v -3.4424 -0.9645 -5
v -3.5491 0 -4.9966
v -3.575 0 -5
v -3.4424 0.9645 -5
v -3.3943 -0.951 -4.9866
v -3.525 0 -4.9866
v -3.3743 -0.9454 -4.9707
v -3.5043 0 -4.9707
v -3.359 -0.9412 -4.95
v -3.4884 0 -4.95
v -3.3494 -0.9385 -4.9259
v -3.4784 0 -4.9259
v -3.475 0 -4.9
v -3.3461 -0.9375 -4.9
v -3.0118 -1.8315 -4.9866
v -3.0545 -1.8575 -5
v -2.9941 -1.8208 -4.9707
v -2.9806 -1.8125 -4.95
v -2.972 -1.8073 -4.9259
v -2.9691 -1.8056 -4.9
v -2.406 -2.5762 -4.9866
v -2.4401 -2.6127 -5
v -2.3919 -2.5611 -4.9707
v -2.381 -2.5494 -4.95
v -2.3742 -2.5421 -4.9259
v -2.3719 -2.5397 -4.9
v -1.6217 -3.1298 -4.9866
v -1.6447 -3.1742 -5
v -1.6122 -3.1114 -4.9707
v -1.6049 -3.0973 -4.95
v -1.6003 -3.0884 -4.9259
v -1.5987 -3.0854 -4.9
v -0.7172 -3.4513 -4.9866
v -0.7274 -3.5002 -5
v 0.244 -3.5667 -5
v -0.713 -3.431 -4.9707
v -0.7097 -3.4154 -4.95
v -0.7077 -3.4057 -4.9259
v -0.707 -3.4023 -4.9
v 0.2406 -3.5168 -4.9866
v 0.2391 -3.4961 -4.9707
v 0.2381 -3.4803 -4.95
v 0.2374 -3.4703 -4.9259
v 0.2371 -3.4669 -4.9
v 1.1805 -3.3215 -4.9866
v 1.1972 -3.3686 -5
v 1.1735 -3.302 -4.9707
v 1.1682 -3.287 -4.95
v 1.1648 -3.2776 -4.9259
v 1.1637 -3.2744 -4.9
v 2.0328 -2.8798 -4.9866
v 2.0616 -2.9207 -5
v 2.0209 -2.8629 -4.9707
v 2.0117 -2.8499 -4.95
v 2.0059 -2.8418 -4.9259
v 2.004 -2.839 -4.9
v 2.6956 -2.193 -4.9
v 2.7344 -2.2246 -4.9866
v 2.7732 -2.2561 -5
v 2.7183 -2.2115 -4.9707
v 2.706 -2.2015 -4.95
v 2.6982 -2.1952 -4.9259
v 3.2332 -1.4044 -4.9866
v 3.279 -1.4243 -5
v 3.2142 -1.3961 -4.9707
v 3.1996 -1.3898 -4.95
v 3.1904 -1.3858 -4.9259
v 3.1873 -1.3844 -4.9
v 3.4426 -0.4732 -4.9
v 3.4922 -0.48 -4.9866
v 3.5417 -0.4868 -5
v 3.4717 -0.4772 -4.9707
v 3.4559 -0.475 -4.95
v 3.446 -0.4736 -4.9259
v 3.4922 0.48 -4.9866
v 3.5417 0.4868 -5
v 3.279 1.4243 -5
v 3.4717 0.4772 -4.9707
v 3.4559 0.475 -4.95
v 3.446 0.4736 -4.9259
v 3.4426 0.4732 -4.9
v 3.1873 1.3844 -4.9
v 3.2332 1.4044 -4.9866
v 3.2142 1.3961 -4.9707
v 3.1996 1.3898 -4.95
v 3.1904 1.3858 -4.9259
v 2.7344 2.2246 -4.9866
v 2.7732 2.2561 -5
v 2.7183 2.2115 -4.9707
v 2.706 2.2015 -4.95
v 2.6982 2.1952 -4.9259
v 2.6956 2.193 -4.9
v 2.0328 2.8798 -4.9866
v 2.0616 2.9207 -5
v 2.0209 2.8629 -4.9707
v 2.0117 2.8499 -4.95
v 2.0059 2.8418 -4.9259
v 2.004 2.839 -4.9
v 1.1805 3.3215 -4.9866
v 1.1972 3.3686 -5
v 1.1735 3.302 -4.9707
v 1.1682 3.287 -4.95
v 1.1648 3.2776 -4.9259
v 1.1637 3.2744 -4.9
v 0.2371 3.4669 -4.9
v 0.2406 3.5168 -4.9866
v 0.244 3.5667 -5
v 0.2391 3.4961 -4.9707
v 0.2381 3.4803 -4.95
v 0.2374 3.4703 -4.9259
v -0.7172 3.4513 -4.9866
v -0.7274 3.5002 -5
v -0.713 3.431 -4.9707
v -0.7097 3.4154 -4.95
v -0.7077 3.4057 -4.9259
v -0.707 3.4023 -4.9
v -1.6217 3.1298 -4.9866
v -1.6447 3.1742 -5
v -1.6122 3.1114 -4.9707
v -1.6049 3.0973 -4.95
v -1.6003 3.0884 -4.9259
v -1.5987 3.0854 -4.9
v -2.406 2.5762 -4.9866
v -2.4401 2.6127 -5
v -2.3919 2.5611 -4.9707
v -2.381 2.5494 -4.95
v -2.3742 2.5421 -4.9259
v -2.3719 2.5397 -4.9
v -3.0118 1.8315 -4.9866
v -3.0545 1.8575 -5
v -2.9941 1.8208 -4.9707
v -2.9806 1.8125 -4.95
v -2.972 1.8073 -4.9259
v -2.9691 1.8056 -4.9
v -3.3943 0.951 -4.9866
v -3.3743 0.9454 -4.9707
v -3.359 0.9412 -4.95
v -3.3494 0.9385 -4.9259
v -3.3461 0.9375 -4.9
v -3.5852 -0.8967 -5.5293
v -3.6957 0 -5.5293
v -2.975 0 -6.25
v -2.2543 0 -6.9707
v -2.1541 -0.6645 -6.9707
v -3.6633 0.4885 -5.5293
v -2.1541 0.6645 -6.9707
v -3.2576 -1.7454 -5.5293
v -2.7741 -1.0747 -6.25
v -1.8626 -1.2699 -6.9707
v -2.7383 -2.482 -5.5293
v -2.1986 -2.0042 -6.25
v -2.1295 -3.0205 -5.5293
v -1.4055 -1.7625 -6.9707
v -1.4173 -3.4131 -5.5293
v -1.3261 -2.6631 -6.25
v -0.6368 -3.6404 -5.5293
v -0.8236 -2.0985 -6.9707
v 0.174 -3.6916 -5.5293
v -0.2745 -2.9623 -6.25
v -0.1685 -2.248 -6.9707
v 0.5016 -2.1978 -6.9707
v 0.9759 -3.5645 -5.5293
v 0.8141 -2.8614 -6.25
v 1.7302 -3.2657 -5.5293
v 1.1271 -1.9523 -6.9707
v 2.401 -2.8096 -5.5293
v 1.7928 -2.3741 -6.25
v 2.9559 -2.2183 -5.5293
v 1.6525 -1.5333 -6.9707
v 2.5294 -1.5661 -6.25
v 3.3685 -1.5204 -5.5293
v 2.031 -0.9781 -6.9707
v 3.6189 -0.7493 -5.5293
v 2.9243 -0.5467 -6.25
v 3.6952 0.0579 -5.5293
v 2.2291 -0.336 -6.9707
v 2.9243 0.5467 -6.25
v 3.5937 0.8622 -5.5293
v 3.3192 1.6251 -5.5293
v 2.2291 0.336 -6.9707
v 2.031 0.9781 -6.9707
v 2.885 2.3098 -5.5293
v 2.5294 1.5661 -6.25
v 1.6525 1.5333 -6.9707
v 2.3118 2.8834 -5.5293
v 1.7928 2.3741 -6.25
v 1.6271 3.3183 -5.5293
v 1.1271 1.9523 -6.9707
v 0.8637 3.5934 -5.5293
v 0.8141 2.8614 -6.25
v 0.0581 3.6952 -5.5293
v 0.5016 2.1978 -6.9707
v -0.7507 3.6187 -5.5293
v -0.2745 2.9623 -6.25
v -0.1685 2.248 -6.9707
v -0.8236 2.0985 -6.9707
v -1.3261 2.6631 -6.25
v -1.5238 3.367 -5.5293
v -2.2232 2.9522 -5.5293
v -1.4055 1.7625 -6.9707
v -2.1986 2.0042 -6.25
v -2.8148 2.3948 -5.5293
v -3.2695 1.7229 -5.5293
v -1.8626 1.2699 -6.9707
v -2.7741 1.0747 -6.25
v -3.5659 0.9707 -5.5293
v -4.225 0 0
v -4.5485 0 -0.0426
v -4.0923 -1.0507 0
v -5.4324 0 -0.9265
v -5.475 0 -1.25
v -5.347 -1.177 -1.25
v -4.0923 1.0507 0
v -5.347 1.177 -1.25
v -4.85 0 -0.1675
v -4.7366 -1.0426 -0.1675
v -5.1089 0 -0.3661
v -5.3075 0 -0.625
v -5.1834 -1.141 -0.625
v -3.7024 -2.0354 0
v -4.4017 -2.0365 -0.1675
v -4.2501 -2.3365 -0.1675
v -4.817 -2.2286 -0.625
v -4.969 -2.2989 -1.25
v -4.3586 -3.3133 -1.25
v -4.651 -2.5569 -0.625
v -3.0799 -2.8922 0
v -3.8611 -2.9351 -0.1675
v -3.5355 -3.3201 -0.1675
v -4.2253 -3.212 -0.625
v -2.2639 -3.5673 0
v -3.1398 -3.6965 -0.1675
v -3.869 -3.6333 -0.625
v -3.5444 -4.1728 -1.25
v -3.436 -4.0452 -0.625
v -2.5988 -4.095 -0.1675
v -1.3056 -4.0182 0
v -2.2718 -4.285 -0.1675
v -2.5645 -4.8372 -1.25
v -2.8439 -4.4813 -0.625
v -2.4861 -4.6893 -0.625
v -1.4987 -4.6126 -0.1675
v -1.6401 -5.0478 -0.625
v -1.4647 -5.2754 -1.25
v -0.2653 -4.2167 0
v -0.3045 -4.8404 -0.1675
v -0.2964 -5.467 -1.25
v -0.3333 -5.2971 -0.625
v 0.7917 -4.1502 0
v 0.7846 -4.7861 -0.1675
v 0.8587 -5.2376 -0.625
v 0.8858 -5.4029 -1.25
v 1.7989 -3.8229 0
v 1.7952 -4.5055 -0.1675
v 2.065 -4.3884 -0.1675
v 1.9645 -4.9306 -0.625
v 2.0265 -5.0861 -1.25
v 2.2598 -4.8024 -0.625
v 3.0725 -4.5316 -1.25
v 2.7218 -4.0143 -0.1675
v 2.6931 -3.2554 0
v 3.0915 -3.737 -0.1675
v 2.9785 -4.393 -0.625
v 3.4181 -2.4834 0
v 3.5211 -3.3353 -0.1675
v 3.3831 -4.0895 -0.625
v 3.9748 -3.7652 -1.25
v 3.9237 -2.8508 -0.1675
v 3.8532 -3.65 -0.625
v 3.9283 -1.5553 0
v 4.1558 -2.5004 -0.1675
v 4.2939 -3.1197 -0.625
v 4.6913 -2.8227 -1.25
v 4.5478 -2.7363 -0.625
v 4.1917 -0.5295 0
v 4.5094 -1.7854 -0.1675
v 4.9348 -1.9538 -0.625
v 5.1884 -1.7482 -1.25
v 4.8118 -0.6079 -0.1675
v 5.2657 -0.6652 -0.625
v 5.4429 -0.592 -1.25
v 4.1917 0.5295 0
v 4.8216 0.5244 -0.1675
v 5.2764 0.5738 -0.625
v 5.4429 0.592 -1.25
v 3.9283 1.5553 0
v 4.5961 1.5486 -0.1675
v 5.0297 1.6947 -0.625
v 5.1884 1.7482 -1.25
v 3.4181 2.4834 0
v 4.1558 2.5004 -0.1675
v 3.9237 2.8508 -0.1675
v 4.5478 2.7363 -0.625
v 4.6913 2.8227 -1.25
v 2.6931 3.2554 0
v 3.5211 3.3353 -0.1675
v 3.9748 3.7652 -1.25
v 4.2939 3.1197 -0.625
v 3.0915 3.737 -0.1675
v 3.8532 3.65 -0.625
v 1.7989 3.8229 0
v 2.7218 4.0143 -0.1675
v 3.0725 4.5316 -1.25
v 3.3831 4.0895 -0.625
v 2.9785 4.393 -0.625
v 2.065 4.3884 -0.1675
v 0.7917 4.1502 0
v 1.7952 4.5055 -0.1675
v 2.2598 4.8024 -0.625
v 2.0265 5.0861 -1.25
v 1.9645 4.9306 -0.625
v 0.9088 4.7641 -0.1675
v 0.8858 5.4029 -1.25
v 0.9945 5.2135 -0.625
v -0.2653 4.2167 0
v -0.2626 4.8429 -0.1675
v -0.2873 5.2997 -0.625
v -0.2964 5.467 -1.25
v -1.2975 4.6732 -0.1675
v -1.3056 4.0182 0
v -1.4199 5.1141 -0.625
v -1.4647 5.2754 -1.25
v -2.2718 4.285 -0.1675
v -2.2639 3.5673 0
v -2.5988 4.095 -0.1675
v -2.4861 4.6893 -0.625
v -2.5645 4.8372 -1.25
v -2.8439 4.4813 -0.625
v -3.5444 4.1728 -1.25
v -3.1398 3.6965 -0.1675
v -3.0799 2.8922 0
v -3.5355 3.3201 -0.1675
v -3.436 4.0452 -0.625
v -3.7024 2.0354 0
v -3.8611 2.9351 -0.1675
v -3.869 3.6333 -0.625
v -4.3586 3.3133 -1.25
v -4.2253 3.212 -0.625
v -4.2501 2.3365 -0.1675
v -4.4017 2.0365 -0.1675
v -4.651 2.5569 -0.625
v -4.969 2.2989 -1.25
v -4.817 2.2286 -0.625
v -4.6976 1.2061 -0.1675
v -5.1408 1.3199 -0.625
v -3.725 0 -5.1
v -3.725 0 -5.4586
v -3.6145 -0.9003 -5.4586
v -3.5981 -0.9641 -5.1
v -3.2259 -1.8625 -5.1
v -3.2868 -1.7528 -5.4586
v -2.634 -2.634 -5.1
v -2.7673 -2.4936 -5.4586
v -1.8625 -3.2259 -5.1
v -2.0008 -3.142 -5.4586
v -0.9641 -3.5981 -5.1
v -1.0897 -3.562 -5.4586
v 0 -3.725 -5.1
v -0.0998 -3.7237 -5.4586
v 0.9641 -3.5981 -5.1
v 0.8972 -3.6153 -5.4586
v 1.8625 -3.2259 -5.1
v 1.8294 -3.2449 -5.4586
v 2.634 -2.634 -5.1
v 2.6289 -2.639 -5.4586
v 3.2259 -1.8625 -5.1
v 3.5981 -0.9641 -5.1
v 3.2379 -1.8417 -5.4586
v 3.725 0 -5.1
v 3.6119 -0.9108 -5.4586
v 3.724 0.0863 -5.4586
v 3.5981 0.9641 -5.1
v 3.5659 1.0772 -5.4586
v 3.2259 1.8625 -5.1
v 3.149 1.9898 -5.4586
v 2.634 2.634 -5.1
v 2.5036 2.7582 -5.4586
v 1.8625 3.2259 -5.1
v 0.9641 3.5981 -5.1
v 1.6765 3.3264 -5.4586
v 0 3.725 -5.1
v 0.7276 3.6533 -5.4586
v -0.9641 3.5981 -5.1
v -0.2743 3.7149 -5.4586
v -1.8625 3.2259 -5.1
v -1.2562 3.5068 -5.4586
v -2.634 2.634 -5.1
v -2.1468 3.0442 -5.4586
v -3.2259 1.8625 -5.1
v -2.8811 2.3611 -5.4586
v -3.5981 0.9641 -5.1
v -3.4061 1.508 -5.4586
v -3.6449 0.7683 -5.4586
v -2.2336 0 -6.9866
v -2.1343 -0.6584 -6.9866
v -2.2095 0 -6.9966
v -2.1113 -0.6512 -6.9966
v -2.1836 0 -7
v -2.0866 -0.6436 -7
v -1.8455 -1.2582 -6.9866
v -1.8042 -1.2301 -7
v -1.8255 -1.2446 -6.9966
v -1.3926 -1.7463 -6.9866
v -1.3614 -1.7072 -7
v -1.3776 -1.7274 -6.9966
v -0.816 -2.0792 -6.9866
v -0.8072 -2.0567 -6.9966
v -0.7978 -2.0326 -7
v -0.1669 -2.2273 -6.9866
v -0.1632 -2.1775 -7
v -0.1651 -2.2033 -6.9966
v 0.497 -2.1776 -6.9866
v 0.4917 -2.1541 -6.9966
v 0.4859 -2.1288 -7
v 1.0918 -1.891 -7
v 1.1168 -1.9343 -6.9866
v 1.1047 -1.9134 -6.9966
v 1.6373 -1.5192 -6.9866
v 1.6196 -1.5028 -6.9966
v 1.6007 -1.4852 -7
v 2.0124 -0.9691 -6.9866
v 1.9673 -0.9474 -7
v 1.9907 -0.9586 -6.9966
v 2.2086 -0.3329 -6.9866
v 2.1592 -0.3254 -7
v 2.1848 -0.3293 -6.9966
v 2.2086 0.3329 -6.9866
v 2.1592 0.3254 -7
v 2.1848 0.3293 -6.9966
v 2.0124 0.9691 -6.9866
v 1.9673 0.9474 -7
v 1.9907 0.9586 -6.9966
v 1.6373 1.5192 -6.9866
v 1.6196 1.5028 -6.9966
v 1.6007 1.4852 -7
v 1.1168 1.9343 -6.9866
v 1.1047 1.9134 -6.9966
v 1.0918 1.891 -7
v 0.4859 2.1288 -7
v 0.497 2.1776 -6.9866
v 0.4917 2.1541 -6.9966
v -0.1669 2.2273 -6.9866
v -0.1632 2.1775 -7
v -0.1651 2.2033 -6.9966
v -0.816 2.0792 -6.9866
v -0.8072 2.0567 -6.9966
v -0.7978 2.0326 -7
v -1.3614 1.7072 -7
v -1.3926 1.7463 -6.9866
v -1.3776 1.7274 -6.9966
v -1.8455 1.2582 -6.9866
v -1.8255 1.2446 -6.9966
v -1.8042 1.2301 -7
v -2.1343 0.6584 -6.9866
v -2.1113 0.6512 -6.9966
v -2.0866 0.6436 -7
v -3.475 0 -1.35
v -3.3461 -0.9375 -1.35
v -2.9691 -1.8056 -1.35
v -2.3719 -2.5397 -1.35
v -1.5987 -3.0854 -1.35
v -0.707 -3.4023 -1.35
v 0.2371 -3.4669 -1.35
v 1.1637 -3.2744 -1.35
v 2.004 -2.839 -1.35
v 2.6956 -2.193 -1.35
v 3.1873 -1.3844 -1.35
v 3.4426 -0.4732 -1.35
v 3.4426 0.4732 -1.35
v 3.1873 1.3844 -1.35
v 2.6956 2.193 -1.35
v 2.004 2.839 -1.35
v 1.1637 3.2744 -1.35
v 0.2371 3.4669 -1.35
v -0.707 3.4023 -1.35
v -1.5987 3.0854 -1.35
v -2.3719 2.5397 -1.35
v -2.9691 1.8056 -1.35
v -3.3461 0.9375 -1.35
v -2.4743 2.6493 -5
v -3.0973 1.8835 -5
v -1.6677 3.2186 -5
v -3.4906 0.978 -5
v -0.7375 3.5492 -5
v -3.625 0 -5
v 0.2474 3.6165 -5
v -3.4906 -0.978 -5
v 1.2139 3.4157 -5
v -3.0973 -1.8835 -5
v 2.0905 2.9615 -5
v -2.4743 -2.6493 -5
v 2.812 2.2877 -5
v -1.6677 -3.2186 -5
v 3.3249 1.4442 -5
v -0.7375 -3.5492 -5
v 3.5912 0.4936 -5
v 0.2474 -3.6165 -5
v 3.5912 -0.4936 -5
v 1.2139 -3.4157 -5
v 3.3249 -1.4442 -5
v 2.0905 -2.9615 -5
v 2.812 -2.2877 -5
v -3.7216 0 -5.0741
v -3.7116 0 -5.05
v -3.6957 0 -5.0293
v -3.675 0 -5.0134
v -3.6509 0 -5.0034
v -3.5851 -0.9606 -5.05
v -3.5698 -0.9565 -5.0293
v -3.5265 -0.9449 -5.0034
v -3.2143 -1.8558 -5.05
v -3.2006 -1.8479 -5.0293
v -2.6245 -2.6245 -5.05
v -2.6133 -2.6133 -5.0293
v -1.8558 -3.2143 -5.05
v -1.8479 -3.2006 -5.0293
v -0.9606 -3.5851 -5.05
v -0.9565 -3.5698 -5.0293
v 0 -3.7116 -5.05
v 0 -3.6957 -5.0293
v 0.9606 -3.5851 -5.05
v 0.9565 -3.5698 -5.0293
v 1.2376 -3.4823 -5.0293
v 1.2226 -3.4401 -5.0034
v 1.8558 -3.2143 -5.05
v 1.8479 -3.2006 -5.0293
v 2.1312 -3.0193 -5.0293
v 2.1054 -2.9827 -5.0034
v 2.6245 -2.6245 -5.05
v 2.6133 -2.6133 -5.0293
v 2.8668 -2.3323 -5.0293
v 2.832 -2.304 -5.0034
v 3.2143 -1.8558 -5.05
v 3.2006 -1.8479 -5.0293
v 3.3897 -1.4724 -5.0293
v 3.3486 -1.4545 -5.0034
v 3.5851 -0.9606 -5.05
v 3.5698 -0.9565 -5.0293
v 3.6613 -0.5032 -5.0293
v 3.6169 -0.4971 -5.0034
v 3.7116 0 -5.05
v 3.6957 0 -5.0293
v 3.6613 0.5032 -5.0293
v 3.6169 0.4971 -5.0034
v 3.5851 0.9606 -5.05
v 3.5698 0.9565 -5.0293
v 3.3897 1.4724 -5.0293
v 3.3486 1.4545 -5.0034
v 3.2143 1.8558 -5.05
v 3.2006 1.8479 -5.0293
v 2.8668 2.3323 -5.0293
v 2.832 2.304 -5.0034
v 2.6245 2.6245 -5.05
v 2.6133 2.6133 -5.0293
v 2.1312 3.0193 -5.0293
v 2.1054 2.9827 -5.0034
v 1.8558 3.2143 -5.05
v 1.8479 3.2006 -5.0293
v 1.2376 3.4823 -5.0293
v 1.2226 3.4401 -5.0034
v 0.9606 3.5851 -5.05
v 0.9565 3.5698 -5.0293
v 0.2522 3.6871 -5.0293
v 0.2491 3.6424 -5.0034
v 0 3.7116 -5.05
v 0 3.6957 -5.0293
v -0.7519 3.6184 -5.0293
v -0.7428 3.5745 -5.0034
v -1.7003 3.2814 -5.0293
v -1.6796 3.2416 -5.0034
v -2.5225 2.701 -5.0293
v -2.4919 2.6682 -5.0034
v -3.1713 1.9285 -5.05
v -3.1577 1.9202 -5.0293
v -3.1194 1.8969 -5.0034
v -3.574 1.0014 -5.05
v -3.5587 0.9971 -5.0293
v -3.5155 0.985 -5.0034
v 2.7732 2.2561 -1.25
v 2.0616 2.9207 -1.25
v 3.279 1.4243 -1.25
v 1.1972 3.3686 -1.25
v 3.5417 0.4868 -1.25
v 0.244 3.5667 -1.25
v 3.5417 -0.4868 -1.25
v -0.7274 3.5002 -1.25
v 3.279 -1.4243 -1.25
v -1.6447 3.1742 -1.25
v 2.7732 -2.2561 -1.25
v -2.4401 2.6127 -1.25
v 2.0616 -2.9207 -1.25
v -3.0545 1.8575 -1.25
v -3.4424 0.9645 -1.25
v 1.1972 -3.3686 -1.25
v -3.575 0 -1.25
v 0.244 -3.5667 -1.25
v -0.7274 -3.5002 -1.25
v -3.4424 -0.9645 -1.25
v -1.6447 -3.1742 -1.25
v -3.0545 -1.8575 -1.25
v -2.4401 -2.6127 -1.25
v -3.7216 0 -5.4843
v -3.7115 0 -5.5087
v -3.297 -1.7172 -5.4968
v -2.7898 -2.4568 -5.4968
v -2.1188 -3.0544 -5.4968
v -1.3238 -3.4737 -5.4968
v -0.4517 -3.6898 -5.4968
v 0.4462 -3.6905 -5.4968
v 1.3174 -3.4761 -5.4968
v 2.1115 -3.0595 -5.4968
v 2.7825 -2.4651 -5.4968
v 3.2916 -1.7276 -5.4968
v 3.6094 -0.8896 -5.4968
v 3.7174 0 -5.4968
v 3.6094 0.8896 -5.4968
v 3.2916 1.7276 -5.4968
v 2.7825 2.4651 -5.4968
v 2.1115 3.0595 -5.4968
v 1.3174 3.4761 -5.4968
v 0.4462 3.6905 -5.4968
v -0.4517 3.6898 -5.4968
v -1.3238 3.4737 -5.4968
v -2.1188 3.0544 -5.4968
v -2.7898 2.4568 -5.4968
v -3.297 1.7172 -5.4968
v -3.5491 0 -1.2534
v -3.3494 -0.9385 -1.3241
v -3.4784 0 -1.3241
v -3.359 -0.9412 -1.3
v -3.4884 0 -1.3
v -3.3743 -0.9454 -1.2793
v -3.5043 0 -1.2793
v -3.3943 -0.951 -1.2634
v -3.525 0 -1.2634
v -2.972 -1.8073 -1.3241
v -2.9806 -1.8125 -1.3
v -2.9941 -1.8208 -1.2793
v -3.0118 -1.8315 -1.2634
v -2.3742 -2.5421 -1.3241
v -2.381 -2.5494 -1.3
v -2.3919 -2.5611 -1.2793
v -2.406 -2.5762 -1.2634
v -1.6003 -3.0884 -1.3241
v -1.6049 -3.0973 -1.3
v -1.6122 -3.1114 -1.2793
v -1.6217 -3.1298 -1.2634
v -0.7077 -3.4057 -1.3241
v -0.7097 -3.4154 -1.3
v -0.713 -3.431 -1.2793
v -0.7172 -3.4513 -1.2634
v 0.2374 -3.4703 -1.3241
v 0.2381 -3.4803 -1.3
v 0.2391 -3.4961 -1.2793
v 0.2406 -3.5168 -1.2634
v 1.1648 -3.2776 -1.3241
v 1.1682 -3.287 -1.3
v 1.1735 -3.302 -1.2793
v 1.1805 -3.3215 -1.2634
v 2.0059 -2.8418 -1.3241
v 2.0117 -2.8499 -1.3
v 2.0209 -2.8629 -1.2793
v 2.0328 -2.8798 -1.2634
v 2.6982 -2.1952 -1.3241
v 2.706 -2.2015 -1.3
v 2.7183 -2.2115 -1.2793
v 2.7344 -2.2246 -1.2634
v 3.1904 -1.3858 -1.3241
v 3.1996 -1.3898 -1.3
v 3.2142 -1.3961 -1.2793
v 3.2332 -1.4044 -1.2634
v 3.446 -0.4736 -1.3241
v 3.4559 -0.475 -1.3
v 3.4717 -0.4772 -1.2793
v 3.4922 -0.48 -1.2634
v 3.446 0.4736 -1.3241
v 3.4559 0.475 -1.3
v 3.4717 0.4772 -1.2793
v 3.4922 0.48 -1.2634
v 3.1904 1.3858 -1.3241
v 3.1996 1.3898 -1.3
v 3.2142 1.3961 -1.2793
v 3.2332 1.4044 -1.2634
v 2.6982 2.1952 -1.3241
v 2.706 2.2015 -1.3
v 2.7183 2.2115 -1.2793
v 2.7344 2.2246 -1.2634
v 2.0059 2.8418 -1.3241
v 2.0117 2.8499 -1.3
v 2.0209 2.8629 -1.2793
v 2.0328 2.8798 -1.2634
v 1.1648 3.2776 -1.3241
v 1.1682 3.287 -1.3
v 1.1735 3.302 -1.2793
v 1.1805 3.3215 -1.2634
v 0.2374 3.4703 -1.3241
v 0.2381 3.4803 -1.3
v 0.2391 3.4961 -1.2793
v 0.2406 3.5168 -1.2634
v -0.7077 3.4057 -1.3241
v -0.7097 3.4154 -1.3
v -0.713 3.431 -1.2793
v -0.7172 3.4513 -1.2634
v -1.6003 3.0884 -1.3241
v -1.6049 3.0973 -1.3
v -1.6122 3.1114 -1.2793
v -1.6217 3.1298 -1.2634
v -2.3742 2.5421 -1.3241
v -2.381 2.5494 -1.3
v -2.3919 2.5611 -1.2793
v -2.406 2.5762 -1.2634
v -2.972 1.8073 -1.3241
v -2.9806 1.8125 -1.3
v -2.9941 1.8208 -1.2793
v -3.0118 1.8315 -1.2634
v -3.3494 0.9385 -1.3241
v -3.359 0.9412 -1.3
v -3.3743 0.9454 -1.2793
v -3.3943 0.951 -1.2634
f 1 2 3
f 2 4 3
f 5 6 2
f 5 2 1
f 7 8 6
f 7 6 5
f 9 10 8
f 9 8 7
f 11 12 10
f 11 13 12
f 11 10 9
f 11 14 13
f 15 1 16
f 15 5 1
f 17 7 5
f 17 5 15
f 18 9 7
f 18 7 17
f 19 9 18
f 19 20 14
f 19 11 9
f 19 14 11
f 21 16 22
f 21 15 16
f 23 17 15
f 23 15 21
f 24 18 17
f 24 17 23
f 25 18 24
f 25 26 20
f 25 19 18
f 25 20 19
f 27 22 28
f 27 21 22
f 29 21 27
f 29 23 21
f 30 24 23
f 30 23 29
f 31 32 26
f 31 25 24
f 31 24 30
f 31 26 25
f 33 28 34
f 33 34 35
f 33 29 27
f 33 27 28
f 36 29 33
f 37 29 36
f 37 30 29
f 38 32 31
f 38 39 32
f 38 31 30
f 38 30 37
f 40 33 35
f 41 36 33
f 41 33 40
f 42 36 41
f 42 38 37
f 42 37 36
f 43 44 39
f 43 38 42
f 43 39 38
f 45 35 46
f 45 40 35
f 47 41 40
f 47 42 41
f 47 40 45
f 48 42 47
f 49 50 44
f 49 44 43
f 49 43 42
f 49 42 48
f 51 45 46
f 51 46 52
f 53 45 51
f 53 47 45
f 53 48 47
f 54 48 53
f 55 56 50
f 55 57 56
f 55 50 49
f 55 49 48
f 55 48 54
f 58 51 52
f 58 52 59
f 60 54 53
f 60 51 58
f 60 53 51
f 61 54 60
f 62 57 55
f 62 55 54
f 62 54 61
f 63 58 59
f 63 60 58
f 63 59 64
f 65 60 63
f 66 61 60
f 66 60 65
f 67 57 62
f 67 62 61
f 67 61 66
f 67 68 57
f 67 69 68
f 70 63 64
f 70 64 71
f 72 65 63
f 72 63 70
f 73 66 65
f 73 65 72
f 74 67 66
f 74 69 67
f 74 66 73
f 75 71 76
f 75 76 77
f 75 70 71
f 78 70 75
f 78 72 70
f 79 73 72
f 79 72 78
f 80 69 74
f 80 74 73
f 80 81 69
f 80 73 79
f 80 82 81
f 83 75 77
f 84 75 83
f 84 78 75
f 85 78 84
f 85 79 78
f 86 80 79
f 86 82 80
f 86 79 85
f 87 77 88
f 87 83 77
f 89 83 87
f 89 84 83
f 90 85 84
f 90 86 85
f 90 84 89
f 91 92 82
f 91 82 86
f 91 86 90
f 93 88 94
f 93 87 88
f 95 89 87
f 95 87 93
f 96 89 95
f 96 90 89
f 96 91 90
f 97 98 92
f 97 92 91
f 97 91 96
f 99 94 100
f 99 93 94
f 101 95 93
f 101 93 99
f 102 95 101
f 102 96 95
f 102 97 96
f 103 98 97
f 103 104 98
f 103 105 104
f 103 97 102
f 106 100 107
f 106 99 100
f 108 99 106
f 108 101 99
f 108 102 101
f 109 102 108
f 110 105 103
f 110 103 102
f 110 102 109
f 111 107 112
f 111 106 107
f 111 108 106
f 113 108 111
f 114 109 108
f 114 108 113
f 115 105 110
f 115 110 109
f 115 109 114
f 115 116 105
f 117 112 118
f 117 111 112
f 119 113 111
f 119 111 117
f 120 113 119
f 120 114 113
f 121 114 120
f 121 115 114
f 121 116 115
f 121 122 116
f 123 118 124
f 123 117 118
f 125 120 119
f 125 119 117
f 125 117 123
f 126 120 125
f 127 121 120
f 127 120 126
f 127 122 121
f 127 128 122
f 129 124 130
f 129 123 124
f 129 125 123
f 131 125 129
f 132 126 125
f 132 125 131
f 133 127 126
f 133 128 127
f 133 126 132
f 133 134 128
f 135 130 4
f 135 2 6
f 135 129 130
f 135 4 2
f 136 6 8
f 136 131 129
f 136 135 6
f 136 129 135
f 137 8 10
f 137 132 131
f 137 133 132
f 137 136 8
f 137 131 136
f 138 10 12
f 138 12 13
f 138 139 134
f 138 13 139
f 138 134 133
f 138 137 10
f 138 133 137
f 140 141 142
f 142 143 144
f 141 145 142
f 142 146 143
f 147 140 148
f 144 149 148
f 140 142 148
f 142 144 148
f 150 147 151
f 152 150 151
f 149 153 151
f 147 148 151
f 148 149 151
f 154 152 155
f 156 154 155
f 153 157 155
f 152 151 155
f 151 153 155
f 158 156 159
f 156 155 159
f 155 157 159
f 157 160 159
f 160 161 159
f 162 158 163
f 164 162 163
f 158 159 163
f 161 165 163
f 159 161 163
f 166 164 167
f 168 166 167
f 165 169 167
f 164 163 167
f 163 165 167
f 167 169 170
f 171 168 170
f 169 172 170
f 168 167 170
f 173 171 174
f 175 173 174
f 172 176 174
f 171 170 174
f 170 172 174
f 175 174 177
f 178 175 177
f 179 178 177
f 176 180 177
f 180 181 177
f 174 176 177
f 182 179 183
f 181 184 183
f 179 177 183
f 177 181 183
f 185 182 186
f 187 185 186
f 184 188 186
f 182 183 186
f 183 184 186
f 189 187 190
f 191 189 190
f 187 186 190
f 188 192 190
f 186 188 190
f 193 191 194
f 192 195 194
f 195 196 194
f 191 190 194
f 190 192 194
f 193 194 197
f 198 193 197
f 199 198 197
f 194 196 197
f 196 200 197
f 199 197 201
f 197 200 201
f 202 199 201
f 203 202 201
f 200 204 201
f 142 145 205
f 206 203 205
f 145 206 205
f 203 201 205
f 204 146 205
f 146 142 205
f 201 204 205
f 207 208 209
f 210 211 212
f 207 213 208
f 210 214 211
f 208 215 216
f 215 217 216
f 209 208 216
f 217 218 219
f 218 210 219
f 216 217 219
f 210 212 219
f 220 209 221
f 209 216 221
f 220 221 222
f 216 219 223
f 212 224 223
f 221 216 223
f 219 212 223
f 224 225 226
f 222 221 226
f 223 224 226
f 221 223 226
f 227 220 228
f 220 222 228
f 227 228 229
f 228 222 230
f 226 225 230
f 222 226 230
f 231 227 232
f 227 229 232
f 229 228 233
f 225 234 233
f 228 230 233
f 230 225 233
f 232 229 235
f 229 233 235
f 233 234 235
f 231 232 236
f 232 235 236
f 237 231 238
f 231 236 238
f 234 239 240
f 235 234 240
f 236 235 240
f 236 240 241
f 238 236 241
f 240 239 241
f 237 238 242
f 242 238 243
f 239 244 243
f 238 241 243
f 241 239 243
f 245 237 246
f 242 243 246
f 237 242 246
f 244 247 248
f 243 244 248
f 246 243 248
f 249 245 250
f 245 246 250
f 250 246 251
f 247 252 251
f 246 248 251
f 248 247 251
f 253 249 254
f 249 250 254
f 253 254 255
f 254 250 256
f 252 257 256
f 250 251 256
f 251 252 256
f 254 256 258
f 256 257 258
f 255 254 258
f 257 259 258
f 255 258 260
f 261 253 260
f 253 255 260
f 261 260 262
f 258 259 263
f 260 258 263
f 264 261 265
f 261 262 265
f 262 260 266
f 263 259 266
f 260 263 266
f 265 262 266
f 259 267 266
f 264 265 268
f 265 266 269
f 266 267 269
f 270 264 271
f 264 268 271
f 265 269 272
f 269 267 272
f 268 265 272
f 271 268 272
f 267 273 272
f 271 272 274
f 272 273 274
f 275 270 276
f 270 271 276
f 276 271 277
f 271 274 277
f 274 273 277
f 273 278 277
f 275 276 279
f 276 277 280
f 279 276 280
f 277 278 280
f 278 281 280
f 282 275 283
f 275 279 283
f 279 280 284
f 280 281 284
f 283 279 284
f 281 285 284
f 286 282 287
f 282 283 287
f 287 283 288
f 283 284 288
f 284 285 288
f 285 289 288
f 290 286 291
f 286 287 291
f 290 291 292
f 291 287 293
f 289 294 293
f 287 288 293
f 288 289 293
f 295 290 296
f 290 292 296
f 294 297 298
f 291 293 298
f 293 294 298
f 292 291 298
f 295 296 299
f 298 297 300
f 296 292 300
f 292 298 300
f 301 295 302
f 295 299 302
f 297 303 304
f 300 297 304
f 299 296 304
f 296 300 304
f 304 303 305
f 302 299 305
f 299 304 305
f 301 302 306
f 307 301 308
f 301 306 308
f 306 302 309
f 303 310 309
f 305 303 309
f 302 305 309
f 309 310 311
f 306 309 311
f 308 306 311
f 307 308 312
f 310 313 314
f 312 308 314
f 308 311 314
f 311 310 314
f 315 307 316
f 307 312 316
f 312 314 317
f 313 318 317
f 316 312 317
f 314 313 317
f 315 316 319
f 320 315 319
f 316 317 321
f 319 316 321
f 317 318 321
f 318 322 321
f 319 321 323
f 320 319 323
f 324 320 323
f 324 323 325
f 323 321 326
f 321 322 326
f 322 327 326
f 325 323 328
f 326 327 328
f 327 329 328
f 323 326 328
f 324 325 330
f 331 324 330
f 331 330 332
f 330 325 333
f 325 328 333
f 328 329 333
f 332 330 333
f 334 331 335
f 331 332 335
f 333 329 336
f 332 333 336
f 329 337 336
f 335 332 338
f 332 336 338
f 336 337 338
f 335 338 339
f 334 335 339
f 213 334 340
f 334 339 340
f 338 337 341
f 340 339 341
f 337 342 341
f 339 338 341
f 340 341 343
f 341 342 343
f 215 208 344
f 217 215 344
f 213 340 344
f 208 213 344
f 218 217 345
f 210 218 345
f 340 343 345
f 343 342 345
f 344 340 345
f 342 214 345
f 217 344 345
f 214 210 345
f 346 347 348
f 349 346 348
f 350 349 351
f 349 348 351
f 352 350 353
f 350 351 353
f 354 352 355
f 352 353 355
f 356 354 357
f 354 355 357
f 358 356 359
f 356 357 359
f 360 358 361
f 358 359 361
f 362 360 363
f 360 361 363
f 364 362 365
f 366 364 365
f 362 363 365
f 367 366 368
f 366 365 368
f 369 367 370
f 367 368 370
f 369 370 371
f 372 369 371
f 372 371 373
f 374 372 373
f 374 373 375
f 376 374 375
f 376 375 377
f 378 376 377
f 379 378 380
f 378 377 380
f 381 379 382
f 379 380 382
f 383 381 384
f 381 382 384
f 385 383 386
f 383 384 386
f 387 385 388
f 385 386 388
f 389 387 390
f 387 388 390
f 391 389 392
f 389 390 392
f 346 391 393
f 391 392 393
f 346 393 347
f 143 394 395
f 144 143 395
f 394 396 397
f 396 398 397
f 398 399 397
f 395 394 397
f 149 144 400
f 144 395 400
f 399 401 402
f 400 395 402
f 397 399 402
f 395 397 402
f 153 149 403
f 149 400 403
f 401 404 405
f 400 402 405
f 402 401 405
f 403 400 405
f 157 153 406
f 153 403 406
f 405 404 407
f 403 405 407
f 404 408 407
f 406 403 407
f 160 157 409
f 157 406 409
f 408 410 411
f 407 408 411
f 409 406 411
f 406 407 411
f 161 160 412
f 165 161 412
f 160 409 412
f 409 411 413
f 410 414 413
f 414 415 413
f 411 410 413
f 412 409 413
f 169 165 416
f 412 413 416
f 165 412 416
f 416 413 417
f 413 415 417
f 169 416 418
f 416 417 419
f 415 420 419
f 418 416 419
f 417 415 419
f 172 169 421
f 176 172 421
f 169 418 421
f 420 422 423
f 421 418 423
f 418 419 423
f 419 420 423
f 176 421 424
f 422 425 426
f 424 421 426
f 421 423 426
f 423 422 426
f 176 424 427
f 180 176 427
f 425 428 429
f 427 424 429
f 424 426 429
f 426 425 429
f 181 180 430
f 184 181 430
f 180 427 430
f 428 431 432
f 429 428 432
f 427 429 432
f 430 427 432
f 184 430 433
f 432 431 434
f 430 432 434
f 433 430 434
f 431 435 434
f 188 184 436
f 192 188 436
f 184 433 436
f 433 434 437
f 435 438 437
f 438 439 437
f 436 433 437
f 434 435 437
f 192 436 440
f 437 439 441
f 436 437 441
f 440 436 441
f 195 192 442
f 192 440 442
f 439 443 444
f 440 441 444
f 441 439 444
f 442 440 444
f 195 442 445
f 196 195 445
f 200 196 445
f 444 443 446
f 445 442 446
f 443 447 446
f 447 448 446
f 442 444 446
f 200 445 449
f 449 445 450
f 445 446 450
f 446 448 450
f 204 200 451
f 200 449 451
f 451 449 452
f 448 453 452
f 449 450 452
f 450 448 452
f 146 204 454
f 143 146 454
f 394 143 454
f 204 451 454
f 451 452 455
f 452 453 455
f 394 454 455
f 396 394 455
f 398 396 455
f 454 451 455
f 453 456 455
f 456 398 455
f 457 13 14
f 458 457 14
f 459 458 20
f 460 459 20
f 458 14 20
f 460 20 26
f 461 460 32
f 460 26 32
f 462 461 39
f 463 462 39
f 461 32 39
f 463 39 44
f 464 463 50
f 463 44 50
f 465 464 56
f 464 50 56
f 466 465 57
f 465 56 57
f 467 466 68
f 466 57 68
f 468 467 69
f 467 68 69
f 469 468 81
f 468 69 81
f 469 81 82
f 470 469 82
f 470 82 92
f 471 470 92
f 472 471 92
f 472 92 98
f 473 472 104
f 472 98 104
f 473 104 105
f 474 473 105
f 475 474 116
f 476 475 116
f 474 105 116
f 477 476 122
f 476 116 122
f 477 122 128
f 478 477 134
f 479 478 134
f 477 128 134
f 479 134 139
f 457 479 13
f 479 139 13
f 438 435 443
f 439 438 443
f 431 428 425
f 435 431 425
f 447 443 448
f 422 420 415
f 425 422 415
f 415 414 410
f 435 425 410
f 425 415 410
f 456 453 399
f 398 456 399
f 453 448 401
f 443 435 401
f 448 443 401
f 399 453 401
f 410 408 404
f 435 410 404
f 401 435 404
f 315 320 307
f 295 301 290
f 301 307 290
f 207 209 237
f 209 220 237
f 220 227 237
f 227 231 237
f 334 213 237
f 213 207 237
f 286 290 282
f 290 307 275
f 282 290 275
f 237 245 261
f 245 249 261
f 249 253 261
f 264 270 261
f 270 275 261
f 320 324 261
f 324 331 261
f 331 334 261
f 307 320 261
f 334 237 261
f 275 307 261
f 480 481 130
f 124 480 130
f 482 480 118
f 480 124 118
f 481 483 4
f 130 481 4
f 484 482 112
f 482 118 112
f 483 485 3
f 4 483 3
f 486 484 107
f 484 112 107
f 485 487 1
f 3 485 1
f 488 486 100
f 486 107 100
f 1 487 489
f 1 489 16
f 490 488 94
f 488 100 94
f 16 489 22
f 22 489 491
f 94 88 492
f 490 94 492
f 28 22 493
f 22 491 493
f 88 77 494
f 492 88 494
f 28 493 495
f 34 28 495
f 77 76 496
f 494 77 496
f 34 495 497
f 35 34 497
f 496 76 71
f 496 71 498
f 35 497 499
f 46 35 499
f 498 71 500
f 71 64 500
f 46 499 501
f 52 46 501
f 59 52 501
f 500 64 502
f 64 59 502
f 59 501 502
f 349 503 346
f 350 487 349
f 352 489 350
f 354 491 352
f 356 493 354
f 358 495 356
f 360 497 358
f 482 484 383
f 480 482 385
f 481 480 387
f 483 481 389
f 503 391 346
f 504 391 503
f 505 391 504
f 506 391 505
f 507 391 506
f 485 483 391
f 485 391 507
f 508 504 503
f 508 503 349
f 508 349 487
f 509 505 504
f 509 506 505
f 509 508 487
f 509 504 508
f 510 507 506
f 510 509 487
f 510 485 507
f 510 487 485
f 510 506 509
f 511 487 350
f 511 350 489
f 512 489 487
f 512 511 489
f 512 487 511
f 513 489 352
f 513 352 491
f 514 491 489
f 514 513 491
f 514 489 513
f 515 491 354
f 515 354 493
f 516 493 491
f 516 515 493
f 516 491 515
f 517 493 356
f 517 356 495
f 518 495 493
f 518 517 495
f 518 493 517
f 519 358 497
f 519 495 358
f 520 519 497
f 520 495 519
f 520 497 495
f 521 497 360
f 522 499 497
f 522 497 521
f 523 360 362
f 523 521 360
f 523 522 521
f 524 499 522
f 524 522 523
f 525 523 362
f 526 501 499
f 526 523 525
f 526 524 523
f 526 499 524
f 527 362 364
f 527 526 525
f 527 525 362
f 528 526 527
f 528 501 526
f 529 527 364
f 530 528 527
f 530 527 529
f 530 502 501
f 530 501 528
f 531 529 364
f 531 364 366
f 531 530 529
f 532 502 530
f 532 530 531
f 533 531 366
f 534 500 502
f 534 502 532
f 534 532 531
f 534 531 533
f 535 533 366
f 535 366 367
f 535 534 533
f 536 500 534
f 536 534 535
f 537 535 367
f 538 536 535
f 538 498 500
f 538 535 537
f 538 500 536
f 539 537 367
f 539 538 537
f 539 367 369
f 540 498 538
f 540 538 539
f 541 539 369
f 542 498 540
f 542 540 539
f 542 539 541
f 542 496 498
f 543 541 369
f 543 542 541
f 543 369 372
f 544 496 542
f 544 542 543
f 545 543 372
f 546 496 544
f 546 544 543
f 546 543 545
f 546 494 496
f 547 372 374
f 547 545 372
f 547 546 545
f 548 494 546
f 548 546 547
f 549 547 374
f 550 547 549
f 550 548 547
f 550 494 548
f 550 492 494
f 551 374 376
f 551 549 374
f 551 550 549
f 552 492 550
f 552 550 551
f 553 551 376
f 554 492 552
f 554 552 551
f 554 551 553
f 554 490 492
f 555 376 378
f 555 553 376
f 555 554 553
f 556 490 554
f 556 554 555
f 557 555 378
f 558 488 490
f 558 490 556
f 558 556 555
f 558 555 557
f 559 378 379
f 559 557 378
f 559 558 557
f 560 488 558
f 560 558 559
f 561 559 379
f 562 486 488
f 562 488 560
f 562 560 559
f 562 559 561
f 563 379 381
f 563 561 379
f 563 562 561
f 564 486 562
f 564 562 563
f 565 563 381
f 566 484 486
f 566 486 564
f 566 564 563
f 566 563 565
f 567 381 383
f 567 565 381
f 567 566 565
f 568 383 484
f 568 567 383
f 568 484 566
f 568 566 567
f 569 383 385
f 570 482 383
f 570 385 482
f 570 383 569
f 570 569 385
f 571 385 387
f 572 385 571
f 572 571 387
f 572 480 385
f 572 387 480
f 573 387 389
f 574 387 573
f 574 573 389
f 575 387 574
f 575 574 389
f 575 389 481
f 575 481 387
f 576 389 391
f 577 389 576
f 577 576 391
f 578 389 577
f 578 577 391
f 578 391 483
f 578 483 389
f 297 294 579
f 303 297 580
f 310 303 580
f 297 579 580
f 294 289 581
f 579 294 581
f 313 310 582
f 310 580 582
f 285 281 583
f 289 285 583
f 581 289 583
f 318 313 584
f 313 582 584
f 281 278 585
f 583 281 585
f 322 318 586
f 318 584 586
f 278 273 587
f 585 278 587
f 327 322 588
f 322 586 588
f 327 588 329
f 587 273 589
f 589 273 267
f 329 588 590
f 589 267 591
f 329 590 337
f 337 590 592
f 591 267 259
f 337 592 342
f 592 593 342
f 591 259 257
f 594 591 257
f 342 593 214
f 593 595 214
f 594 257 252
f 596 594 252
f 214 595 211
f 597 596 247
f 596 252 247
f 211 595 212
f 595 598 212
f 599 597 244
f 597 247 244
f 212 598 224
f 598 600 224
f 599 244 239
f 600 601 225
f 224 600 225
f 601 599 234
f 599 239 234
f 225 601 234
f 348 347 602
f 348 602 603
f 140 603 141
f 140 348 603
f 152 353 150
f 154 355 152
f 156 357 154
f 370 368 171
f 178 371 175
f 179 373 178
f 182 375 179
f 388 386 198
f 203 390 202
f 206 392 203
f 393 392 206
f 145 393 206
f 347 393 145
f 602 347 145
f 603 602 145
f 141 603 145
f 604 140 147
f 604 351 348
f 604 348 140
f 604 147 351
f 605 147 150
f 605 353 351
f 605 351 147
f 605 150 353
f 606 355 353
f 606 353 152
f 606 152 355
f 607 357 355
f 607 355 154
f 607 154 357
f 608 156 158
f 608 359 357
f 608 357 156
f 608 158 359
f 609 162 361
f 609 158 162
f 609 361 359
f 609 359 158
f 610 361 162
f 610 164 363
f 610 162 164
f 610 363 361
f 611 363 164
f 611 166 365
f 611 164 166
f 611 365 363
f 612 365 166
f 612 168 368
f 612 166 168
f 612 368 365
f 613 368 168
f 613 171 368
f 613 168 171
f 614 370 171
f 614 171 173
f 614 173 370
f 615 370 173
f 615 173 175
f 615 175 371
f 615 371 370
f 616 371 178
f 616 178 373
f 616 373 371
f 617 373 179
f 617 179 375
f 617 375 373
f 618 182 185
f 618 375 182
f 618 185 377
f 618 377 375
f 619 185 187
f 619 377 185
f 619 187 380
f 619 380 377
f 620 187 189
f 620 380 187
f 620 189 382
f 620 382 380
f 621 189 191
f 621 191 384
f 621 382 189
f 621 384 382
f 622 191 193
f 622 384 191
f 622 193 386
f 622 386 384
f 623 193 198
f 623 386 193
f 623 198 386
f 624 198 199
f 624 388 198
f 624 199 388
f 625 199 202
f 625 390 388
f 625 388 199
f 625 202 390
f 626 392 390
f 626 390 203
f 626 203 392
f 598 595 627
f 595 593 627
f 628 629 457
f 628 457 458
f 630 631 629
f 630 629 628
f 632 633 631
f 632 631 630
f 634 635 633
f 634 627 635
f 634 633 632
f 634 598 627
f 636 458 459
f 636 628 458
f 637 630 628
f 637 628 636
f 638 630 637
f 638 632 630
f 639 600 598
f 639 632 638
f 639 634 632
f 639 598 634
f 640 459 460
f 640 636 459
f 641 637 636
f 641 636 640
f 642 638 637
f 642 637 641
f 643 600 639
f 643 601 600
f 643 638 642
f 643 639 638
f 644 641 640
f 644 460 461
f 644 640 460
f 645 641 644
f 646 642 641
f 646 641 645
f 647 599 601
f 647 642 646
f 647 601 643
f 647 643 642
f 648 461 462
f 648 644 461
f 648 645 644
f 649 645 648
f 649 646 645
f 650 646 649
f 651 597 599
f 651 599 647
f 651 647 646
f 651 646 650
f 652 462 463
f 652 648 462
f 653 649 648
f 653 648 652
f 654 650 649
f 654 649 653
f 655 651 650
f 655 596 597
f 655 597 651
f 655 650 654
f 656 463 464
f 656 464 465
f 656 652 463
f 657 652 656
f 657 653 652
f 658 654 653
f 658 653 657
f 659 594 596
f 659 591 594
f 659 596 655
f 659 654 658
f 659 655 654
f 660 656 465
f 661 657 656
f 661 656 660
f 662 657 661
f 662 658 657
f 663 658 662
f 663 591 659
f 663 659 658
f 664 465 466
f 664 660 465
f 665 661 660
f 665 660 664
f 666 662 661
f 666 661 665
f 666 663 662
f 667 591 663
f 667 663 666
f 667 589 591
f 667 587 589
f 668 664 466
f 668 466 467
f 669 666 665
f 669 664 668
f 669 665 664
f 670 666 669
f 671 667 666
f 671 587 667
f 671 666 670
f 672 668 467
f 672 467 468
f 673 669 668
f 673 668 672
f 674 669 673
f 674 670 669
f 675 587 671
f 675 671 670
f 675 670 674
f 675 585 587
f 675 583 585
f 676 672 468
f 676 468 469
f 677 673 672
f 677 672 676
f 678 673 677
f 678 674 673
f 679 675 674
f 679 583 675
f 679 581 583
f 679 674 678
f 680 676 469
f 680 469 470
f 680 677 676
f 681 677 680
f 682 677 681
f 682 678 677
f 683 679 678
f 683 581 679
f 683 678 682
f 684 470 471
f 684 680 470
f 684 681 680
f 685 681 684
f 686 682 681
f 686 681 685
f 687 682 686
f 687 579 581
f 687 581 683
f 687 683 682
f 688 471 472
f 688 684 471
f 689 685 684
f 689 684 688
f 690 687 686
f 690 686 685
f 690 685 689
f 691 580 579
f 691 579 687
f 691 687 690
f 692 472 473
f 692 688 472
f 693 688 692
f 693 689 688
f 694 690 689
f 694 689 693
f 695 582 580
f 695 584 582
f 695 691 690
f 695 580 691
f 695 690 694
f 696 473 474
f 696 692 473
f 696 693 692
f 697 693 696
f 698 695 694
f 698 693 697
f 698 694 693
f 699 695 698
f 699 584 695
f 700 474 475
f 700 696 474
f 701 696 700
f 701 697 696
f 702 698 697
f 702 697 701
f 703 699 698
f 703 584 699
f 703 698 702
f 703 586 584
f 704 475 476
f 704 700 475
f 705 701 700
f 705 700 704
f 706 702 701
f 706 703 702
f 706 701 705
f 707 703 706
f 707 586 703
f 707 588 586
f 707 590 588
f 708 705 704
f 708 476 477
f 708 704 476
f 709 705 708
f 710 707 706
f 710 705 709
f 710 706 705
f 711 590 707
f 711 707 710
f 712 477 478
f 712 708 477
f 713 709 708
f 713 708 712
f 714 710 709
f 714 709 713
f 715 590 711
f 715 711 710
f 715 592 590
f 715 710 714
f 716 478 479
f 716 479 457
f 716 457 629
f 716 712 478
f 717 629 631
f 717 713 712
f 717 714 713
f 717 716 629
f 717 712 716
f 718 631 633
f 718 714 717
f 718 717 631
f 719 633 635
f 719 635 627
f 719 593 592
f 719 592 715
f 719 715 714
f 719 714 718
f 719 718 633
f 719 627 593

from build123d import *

# Parameters (mm, degrees)
F2_R    = 1.24999
F3_SIZE = 1.5
F4_R    = 0.1


# Not quite as in the source:
# - a fillet or chamfer is up to 0.001 mm smaller than in the source, because OpenCascade refuses the exact size


with BuildPart() as f1:
    # F0 (on Front) → F1 (revolve)
    with BuildSketch(Plane.XZ):
        Polygon((0, -7), (0, 0), (-5.475, 0), (-5.475, -1.25), (-3.475, -1.25), (-3.475, -5), (-3.725, -5), (-3.725, -7), align=None)
    revolve(axis=Axis((0, 0, -3.5), (0, 0, 1)))

    # F2 (radius 1.25 in the source; OpenCascade refuses exactly that, so slightly less here)
    f2_edges = [f1.edges().sort_by_distance(p)[0] for p in [
        (5.475, 0, 0),
    ]]
    fillet(f2_edges, radius=F2_R)

    # F3
    f3_edges = [f1.edges().sort_by_distance(p)[0] for p in [
        (3.725, 0, -7),
    ]]
    chamfer(f3_edges, length=F3_SIZE)

    # F4
    f4_edges = [f1.edges().sort_by_distance(p)[0] for p in [
        (3.725, 0, -5),
        (2.225, 0, -7),
        (3.475, 0, -5),
        (3.475, 0, -1.25),
        (3.725, 0, -5.5),
    ]]
    fillet(f4_edges, radius=F4_R)


solid = f1.part
